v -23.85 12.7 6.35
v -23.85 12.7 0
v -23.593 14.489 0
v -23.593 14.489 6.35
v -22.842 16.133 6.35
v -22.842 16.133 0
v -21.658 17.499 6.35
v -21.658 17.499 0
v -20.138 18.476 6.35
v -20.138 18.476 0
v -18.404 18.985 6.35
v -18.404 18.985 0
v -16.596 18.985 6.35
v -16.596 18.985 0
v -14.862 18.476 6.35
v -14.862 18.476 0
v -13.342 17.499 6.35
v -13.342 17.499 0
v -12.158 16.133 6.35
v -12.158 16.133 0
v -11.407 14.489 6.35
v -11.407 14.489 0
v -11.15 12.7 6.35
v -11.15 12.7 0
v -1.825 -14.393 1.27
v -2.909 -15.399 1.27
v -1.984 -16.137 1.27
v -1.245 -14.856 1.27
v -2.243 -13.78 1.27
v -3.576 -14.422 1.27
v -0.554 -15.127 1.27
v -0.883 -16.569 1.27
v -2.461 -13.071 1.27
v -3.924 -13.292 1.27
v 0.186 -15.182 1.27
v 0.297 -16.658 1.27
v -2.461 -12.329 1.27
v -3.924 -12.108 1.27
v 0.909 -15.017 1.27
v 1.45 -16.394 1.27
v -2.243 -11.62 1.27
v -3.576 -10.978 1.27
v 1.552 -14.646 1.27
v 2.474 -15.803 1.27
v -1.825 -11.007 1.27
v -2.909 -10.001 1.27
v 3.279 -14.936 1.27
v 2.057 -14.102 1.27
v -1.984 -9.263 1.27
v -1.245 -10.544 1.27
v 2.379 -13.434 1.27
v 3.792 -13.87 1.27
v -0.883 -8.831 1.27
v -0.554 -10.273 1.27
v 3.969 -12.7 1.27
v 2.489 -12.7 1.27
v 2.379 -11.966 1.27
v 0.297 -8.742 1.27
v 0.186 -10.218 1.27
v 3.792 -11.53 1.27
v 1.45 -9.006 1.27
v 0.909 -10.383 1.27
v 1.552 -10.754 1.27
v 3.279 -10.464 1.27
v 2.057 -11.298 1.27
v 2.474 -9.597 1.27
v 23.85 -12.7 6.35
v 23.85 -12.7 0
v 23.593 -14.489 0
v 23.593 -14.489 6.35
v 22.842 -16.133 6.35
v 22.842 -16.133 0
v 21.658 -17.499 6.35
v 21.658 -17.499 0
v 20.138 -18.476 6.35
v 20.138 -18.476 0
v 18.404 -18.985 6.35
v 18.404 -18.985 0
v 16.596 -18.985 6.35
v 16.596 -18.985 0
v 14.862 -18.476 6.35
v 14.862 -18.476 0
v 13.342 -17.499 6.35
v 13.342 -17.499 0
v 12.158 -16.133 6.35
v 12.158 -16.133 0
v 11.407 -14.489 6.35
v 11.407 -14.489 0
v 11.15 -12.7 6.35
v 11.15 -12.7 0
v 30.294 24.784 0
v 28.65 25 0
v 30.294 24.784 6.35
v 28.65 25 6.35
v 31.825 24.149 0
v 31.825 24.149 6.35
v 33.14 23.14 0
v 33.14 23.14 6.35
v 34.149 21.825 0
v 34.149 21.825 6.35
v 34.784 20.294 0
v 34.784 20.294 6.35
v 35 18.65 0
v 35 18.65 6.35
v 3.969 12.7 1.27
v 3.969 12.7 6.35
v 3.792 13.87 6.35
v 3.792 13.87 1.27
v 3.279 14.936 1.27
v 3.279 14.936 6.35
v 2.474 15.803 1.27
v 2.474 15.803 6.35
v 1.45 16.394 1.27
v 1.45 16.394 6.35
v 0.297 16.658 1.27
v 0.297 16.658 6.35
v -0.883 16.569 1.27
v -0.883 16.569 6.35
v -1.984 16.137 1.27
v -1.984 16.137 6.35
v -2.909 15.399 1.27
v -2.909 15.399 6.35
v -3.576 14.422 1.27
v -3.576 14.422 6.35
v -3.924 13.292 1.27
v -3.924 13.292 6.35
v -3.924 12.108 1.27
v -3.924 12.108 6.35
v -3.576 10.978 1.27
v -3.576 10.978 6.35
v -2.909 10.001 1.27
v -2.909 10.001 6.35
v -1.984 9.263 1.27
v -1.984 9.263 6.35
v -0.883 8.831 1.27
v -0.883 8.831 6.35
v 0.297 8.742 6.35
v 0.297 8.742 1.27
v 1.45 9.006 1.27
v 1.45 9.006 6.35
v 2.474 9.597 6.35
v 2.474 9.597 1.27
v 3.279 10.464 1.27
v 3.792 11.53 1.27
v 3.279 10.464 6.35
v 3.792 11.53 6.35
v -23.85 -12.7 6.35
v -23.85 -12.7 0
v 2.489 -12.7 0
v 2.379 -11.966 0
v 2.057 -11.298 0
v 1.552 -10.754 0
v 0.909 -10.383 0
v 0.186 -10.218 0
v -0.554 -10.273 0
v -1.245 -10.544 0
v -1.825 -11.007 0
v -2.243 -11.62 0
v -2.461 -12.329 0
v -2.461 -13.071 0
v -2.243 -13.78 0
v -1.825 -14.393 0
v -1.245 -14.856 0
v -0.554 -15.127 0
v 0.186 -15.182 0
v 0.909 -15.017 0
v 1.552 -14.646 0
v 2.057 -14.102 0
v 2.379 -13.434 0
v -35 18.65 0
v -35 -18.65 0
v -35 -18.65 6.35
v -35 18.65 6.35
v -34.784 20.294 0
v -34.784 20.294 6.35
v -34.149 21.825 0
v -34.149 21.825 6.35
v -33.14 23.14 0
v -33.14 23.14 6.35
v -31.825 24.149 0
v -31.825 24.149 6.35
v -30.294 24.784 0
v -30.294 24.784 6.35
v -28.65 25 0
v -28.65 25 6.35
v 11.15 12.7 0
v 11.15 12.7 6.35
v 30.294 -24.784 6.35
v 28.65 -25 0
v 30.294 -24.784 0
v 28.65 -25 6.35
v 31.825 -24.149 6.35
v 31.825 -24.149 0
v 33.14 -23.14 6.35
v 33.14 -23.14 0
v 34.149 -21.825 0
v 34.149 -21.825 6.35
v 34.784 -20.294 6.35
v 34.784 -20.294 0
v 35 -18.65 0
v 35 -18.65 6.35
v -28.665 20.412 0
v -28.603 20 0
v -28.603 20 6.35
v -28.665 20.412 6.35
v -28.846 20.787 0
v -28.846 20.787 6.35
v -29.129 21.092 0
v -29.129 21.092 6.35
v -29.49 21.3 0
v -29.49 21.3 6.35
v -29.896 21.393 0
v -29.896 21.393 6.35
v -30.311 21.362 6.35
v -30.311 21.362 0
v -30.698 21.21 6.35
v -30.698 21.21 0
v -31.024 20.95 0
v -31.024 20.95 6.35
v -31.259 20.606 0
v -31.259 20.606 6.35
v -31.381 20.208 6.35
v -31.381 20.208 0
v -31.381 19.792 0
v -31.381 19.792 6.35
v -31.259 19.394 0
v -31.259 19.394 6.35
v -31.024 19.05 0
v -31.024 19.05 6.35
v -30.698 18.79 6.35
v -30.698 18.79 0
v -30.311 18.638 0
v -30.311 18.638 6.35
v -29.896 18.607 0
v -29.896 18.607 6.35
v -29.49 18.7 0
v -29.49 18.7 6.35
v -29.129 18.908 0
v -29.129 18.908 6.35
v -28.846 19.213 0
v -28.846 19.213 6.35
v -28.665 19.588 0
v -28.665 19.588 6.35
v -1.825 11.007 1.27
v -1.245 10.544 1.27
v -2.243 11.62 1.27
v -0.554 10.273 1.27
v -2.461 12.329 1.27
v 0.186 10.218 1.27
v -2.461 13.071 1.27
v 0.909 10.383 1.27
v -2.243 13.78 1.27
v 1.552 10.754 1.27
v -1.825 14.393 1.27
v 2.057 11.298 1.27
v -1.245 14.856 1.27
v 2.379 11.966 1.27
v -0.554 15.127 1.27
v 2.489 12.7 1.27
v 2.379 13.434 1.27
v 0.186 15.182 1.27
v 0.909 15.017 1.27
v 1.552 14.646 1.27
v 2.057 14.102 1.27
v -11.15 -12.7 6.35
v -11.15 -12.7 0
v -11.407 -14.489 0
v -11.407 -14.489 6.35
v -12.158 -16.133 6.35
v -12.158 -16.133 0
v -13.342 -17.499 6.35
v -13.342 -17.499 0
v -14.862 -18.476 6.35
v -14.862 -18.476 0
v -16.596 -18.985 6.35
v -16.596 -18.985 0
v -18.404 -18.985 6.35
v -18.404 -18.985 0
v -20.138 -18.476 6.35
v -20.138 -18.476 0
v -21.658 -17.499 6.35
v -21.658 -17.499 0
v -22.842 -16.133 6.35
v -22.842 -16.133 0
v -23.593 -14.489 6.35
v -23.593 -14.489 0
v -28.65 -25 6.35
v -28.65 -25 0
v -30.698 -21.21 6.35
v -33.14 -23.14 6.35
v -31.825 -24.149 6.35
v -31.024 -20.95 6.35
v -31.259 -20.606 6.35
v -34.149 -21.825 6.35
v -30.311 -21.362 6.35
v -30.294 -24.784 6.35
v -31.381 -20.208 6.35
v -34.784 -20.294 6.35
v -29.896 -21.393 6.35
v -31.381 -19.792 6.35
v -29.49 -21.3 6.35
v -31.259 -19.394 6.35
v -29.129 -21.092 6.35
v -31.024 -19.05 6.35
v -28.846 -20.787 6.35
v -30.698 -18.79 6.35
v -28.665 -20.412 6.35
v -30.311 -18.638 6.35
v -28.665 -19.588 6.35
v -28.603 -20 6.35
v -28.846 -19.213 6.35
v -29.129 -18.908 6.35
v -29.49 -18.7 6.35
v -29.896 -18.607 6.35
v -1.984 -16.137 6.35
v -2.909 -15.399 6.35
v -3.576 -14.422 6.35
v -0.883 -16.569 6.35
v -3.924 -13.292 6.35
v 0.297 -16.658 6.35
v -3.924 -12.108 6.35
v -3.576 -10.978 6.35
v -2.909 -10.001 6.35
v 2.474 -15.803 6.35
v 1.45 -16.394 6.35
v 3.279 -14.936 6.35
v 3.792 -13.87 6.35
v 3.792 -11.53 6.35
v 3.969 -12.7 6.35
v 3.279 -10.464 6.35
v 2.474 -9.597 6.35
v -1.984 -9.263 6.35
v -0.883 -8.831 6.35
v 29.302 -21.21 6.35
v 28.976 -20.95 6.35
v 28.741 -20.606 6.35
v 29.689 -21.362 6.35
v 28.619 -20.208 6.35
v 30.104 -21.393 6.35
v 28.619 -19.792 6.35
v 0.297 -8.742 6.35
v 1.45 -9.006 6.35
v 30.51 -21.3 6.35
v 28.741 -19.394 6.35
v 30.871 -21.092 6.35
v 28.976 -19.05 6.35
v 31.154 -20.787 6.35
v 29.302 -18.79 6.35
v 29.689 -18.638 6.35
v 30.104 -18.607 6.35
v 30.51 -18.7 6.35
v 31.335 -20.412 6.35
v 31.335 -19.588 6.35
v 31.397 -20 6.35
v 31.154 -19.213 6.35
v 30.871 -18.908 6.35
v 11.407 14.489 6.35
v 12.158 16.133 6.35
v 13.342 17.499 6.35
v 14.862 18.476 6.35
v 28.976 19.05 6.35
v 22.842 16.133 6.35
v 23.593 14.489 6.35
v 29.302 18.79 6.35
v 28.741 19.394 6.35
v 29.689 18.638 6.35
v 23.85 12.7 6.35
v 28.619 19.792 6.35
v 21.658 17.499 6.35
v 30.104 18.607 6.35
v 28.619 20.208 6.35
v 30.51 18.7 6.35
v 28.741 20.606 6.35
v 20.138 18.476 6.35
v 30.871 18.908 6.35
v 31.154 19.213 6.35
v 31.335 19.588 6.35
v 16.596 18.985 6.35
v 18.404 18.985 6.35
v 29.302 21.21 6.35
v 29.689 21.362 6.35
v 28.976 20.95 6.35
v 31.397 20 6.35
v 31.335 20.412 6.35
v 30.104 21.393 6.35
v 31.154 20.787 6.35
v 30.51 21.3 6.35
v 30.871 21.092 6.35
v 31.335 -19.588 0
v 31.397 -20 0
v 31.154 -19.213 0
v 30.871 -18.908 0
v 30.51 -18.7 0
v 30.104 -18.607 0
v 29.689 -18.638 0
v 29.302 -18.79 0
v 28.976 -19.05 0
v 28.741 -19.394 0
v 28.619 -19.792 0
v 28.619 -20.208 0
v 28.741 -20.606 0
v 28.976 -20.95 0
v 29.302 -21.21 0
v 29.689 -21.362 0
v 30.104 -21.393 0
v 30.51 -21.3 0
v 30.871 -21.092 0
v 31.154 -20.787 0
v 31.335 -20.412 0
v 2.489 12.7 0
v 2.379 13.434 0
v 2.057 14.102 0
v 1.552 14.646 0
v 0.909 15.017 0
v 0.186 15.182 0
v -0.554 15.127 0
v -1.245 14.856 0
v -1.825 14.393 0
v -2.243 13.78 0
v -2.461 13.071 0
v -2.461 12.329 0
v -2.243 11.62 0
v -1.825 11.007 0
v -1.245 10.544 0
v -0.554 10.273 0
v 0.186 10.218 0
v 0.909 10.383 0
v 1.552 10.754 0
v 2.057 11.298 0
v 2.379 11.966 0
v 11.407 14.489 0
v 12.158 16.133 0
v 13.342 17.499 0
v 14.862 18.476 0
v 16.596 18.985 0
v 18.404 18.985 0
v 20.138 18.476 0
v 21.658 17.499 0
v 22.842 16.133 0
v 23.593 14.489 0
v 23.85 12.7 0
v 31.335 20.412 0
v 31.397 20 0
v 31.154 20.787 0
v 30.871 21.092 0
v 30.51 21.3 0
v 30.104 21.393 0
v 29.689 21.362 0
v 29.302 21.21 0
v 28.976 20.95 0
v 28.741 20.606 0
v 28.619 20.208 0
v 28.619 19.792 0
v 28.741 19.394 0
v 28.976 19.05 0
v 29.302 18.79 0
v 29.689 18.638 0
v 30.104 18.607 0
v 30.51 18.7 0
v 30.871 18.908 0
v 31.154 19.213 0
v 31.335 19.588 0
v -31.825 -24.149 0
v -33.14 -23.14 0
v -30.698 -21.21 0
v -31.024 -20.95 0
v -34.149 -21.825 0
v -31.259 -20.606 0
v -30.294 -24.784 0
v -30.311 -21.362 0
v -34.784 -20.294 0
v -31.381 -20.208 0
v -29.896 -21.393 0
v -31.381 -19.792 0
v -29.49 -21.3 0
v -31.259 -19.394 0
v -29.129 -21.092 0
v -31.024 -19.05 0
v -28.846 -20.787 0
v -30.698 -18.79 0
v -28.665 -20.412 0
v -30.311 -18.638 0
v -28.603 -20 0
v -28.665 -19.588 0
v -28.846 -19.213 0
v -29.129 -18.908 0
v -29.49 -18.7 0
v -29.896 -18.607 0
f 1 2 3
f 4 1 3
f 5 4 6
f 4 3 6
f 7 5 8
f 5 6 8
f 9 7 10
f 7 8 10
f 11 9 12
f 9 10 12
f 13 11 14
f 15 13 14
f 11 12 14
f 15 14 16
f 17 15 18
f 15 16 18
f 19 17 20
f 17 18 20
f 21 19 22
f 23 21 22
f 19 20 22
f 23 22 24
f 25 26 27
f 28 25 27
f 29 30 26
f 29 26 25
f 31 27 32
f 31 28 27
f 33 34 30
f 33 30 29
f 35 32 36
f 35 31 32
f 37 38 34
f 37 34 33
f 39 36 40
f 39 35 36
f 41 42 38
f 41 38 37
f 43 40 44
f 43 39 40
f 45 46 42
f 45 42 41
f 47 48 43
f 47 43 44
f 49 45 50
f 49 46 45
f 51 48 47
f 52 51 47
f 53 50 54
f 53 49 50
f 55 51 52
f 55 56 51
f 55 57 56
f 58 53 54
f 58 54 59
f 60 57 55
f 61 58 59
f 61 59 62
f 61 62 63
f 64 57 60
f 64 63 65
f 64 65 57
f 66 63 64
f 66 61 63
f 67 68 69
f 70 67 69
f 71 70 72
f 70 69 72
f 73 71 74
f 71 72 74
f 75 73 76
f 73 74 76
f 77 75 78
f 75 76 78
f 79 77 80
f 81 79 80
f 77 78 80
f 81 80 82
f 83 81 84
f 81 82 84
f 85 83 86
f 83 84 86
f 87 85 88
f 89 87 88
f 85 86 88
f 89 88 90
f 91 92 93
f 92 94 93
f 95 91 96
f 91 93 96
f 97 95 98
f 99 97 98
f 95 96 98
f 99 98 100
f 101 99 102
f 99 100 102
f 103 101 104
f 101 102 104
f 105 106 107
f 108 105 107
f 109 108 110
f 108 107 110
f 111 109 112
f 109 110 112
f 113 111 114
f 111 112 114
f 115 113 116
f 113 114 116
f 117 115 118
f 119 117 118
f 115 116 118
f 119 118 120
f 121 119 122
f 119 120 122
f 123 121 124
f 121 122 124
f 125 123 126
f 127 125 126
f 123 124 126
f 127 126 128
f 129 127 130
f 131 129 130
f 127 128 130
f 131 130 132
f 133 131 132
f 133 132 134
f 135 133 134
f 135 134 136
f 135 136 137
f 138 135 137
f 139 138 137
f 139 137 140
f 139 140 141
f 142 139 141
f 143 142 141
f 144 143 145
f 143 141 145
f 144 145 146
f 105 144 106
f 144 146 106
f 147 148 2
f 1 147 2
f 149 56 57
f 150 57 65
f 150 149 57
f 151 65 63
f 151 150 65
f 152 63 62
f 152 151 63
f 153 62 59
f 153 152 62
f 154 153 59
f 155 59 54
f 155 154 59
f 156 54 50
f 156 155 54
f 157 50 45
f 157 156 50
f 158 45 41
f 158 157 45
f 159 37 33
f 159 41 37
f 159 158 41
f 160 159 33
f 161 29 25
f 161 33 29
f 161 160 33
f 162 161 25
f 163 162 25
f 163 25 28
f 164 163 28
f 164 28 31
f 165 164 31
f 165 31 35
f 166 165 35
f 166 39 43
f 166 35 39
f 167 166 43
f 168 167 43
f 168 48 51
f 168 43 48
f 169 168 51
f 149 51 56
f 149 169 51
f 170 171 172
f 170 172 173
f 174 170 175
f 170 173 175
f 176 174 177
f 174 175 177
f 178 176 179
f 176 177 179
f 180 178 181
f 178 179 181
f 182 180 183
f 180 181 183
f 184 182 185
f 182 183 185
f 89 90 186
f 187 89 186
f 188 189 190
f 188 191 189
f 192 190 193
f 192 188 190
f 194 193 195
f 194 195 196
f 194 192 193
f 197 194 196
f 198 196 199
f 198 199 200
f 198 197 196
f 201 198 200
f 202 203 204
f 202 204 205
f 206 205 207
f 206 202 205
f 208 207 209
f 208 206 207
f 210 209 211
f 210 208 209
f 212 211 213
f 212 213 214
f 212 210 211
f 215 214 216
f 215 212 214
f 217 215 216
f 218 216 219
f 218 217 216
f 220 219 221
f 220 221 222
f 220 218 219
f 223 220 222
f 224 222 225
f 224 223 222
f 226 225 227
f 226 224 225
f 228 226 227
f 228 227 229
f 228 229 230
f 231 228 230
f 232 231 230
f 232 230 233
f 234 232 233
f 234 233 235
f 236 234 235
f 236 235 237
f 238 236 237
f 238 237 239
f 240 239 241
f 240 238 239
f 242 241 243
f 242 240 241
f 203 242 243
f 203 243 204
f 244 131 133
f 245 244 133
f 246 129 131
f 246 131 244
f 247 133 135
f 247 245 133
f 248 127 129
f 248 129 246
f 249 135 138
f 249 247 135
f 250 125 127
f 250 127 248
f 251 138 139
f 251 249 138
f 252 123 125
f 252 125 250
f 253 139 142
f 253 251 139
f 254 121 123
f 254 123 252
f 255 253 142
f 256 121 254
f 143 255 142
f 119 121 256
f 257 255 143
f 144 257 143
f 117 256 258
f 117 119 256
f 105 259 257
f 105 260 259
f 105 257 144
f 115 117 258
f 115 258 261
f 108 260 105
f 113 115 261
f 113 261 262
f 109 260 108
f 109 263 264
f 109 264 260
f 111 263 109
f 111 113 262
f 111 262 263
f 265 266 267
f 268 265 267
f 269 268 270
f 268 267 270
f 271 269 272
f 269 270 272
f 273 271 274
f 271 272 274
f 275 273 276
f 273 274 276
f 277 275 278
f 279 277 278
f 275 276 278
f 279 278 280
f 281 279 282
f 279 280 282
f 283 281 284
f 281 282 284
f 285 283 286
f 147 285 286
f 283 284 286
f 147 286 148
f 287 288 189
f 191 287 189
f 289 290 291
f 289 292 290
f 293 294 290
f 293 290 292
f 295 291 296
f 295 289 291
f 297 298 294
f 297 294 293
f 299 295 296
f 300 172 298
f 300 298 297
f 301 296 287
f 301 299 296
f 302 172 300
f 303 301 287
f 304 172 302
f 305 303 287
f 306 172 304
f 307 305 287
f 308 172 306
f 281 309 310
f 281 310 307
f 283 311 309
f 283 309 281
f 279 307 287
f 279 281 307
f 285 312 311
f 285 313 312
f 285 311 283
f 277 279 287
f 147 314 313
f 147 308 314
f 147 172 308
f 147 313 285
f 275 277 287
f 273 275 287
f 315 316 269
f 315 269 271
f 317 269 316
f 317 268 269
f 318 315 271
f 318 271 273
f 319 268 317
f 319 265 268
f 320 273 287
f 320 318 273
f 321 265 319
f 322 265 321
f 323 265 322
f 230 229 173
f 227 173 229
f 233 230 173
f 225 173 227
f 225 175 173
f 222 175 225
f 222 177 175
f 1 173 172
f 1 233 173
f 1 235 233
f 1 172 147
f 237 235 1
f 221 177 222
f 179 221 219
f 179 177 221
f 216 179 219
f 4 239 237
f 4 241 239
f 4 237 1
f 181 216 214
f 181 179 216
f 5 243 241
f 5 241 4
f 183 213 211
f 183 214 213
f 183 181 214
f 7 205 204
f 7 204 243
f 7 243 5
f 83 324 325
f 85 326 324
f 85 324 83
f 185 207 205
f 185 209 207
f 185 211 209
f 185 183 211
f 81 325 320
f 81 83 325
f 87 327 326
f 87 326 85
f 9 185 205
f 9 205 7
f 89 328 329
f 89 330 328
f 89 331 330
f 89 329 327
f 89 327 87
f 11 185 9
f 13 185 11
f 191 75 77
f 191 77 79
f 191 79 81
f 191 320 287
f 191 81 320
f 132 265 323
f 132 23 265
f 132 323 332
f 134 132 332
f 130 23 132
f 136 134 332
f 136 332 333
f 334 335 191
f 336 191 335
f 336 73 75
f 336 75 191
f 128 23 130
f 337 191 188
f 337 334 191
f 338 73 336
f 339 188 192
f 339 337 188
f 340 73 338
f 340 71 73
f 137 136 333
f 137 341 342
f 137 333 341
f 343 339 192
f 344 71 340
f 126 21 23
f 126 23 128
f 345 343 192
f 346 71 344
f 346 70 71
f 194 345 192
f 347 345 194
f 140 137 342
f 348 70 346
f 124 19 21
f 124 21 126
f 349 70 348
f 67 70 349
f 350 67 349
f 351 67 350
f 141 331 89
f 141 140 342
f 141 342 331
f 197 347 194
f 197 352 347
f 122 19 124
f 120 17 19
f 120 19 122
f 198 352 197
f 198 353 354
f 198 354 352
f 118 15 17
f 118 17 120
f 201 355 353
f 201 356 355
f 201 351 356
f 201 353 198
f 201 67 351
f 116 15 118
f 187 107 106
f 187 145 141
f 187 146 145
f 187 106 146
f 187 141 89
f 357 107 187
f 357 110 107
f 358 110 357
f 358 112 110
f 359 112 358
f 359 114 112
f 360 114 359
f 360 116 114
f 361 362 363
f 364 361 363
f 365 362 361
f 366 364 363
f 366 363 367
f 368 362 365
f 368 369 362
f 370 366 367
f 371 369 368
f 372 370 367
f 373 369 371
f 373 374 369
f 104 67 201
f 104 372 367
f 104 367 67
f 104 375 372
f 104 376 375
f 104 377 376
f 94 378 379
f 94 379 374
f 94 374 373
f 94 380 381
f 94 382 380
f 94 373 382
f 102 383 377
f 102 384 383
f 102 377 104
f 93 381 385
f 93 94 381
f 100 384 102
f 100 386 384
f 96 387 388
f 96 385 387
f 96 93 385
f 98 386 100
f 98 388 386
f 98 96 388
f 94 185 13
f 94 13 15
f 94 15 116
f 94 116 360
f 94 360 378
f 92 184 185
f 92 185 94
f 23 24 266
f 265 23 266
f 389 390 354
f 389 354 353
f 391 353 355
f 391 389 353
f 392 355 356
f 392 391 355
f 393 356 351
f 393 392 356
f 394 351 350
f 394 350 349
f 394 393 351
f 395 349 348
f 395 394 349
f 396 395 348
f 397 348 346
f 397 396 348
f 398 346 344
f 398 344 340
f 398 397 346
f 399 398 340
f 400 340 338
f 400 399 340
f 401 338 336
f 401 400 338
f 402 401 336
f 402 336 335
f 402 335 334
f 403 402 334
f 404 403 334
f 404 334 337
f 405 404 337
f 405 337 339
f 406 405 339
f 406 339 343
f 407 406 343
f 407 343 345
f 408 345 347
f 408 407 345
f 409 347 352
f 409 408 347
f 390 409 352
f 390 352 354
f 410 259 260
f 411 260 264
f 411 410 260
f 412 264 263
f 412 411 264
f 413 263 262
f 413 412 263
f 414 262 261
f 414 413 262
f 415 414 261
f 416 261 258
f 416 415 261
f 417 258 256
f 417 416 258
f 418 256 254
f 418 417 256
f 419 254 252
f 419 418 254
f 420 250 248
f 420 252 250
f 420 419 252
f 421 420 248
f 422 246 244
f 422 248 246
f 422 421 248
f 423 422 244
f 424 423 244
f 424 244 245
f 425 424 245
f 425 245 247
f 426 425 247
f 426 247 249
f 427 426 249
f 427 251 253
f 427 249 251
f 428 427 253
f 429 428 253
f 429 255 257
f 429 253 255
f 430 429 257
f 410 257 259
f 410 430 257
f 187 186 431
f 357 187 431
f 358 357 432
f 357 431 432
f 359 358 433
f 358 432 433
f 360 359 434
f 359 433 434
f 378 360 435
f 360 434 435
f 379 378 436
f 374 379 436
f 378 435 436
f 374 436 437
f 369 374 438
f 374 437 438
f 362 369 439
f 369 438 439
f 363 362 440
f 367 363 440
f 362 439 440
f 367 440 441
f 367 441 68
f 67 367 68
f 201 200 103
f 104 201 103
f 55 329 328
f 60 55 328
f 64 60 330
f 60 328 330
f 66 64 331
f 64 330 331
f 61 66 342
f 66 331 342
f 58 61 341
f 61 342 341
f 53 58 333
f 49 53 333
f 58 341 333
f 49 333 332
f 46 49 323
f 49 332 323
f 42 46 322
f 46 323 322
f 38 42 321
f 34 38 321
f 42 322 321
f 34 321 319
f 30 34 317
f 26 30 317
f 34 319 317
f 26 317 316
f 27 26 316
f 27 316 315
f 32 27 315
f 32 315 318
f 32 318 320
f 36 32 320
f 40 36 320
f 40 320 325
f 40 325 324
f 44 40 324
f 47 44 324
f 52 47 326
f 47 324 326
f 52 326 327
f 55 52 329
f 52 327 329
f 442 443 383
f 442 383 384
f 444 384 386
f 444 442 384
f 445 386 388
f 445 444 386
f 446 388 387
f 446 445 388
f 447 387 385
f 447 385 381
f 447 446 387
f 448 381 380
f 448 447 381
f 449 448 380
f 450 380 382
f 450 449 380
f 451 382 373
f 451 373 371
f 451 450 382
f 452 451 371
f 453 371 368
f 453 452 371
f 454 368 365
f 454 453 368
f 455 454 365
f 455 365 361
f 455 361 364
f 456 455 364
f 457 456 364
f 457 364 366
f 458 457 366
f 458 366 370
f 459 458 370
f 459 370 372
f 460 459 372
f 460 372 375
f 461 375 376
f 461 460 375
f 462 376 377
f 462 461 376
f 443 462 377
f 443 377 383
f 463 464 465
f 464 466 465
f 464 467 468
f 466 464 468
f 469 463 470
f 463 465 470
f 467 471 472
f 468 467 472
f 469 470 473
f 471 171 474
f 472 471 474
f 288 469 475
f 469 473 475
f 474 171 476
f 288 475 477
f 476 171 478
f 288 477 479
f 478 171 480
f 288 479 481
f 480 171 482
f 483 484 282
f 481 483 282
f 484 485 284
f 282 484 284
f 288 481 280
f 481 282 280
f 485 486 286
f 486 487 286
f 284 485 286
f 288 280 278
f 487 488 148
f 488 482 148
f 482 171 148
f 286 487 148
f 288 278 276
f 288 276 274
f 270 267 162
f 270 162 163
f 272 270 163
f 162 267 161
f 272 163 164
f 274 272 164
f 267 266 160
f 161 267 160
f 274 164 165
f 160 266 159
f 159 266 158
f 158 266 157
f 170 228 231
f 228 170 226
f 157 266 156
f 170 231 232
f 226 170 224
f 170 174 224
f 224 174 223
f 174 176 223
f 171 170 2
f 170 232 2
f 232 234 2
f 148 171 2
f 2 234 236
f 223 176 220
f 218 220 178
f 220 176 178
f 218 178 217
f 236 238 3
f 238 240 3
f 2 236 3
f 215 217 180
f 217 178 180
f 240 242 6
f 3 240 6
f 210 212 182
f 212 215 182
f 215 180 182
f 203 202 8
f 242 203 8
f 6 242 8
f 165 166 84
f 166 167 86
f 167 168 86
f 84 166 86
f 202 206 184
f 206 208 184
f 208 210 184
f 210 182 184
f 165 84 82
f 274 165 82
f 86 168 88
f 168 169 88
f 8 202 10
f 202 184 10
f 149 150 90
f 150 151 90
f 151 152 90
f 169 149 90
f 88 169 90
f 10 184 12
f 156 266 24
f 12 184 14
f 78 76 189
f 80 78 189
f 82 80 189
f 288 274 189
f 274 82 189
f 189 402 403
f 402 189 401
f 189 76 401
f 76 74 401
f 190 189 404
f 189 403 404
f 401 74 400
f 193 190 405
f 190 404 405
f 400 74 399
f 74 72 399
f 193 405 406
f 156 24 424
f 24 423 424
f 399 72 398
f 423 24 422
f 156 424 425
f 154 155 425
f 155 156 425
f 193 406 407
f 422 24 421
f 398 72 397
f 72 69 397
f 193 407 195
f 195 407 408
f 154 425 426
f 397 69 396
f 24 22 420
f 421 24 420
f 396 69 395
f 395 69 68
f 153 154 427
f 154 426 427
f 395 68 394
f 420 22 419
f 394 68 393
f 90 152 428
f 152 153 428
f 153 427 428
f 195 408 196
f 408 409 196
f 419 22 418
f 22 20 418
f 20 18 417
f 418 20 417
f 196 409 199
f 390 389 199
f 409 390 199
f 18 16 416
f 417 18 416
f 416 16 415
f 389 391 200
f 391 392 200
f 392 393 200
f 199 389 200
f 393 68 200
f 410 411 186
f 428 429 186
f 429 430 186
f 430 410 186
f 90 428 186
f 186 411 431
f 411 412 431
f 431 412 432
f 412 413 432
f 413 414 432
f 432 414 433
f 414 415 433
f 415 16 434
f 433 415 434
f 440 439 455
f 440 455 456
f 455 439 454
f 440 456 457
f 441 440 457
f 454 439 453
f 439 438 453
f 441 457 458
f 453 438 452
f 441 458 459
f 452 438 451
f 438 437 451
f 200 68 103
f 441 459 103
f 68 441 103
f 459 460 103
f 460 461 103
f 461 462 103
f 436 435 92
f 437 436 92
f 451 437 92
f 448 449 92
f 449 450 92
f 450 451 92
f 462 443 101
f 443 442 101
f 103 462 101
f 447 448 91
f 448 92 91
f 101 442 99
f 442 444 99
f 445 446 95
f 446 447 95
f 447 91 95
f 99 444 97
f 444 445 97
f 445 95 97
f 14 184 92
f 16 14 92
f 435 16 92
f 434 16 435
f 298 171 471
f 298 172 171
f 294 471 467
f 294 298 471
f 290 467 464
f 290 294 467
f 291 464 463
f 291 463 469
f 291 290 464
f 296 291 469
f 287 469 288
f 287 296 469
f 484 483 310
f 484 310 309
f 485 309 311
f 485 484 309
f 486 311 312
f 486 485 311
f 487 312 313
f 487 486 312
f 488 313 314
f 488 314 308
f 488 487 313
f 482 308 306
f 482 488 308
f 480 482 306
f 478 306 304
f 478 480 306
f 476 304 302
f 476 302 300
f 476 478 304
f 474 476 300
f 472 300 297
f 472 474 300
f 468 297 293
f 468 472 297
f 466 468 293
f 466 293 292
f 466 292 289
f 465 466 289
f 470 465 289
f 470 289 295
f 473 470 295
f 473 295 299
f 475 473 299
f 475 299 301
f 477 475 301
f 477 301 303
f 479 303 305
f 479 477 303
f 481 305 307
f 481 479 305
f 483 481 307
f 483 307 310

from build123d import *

# Parameters (mm, degrees)
SKETCH1_W           = 70
SKETCH1_H           = 50
SKETCH1_R           = 1.397
SKETCH1_R_2         = 2.4892
BOSS_EXTRUDE1_DEPTH = 6.35
FILLET1_R           = 6.35
SKETCH3_R           = 3.96875
CUT_EXTRUDE1_DEPTH  = 5.08


with BuildPart() as part:
    # Sketch1 → Boss-Extrude1 (new body)
    with BuildSketch(Plane.XY):
        Rectangle(SKETCH1_W, SKETCH1_H)
        with Locations((30, 20)):
            Circle(SKETCH1_R, mode=Mode.SUBTRACT)
        with Locations((30, -20)):
            Circle(SKETCH1_R, mode=Mode.SUBTRACT)
        with Locations((-30, -20)):
            Circle(SKETCH1_R, mode=Mode.SUBTRACT)
        with Locations((-30, 20)):
            Circle(SKETCH1_R, mode=Mode.SUBTRACT)
        with Locations((0, 12.7)):
            Circle(SKETCH1_R_2, mode=Mode.SUBTRACT)
        with Locations((0, -12.7)):
            Circle(SKETCH1_R_2, mode=Mode.SUBTRACT)
        with BuildLine():
            Line((-23.85, -12.7), (-23.85, 12.7))
            ThreePointArc((-23.85, 12.7), (-17.5, 19.05), (-11.15, 12.7))
            Line((-11.15, 12.7), (-11.15, -12.7))
            ThreePointArc((-11.15, -12.7), (-17.5, -19.05), (-23.85, -12.7))
        make_face(mode=Mode.SUBTRACT)
        with BuildLine():
            Line((23.85, 12.7), (23.85, -12.7))
            ThreePointArc((23.85, -12.7), (17.5, -19.05), (11.15, -12.7))
            Line((11.15, -12.7), (11.15, 12.7))
            ThreePointArc((11.15, 12.7), (17.5, 19.05), (23.85, 12.7))
        make_face(mode=Mode.SUBTRACT)
    extrude(amount=BOSS_EXTRUDE1_DEPTH)

    # Fillet1
    fillet1_edges = [part.edges().sort_by_distance(p)[0] for p in [
        (-35, 25, 3.175),
        (35, 25, 3.175),
        (35, -25, 3.175),
        (-35, -25, 3.175),
    ]]
    fillet(fillet1_edges, radius=FILLET1_R)

    # Sketch3 → Cut-Extrude1 (cut)
    with BuildSketch(Plane.XY.offset(6.35)):
        with Locations((0, 12.7)):
            Circle(SKETCH3_R)
        with Locations((0, -12.7)):
            Circle(SKETCH3_R)
    extrude(amount=-CUT_EXTRUDE1_DEPTH, mode=Mode.SUBTRACT)


solid = part.part
